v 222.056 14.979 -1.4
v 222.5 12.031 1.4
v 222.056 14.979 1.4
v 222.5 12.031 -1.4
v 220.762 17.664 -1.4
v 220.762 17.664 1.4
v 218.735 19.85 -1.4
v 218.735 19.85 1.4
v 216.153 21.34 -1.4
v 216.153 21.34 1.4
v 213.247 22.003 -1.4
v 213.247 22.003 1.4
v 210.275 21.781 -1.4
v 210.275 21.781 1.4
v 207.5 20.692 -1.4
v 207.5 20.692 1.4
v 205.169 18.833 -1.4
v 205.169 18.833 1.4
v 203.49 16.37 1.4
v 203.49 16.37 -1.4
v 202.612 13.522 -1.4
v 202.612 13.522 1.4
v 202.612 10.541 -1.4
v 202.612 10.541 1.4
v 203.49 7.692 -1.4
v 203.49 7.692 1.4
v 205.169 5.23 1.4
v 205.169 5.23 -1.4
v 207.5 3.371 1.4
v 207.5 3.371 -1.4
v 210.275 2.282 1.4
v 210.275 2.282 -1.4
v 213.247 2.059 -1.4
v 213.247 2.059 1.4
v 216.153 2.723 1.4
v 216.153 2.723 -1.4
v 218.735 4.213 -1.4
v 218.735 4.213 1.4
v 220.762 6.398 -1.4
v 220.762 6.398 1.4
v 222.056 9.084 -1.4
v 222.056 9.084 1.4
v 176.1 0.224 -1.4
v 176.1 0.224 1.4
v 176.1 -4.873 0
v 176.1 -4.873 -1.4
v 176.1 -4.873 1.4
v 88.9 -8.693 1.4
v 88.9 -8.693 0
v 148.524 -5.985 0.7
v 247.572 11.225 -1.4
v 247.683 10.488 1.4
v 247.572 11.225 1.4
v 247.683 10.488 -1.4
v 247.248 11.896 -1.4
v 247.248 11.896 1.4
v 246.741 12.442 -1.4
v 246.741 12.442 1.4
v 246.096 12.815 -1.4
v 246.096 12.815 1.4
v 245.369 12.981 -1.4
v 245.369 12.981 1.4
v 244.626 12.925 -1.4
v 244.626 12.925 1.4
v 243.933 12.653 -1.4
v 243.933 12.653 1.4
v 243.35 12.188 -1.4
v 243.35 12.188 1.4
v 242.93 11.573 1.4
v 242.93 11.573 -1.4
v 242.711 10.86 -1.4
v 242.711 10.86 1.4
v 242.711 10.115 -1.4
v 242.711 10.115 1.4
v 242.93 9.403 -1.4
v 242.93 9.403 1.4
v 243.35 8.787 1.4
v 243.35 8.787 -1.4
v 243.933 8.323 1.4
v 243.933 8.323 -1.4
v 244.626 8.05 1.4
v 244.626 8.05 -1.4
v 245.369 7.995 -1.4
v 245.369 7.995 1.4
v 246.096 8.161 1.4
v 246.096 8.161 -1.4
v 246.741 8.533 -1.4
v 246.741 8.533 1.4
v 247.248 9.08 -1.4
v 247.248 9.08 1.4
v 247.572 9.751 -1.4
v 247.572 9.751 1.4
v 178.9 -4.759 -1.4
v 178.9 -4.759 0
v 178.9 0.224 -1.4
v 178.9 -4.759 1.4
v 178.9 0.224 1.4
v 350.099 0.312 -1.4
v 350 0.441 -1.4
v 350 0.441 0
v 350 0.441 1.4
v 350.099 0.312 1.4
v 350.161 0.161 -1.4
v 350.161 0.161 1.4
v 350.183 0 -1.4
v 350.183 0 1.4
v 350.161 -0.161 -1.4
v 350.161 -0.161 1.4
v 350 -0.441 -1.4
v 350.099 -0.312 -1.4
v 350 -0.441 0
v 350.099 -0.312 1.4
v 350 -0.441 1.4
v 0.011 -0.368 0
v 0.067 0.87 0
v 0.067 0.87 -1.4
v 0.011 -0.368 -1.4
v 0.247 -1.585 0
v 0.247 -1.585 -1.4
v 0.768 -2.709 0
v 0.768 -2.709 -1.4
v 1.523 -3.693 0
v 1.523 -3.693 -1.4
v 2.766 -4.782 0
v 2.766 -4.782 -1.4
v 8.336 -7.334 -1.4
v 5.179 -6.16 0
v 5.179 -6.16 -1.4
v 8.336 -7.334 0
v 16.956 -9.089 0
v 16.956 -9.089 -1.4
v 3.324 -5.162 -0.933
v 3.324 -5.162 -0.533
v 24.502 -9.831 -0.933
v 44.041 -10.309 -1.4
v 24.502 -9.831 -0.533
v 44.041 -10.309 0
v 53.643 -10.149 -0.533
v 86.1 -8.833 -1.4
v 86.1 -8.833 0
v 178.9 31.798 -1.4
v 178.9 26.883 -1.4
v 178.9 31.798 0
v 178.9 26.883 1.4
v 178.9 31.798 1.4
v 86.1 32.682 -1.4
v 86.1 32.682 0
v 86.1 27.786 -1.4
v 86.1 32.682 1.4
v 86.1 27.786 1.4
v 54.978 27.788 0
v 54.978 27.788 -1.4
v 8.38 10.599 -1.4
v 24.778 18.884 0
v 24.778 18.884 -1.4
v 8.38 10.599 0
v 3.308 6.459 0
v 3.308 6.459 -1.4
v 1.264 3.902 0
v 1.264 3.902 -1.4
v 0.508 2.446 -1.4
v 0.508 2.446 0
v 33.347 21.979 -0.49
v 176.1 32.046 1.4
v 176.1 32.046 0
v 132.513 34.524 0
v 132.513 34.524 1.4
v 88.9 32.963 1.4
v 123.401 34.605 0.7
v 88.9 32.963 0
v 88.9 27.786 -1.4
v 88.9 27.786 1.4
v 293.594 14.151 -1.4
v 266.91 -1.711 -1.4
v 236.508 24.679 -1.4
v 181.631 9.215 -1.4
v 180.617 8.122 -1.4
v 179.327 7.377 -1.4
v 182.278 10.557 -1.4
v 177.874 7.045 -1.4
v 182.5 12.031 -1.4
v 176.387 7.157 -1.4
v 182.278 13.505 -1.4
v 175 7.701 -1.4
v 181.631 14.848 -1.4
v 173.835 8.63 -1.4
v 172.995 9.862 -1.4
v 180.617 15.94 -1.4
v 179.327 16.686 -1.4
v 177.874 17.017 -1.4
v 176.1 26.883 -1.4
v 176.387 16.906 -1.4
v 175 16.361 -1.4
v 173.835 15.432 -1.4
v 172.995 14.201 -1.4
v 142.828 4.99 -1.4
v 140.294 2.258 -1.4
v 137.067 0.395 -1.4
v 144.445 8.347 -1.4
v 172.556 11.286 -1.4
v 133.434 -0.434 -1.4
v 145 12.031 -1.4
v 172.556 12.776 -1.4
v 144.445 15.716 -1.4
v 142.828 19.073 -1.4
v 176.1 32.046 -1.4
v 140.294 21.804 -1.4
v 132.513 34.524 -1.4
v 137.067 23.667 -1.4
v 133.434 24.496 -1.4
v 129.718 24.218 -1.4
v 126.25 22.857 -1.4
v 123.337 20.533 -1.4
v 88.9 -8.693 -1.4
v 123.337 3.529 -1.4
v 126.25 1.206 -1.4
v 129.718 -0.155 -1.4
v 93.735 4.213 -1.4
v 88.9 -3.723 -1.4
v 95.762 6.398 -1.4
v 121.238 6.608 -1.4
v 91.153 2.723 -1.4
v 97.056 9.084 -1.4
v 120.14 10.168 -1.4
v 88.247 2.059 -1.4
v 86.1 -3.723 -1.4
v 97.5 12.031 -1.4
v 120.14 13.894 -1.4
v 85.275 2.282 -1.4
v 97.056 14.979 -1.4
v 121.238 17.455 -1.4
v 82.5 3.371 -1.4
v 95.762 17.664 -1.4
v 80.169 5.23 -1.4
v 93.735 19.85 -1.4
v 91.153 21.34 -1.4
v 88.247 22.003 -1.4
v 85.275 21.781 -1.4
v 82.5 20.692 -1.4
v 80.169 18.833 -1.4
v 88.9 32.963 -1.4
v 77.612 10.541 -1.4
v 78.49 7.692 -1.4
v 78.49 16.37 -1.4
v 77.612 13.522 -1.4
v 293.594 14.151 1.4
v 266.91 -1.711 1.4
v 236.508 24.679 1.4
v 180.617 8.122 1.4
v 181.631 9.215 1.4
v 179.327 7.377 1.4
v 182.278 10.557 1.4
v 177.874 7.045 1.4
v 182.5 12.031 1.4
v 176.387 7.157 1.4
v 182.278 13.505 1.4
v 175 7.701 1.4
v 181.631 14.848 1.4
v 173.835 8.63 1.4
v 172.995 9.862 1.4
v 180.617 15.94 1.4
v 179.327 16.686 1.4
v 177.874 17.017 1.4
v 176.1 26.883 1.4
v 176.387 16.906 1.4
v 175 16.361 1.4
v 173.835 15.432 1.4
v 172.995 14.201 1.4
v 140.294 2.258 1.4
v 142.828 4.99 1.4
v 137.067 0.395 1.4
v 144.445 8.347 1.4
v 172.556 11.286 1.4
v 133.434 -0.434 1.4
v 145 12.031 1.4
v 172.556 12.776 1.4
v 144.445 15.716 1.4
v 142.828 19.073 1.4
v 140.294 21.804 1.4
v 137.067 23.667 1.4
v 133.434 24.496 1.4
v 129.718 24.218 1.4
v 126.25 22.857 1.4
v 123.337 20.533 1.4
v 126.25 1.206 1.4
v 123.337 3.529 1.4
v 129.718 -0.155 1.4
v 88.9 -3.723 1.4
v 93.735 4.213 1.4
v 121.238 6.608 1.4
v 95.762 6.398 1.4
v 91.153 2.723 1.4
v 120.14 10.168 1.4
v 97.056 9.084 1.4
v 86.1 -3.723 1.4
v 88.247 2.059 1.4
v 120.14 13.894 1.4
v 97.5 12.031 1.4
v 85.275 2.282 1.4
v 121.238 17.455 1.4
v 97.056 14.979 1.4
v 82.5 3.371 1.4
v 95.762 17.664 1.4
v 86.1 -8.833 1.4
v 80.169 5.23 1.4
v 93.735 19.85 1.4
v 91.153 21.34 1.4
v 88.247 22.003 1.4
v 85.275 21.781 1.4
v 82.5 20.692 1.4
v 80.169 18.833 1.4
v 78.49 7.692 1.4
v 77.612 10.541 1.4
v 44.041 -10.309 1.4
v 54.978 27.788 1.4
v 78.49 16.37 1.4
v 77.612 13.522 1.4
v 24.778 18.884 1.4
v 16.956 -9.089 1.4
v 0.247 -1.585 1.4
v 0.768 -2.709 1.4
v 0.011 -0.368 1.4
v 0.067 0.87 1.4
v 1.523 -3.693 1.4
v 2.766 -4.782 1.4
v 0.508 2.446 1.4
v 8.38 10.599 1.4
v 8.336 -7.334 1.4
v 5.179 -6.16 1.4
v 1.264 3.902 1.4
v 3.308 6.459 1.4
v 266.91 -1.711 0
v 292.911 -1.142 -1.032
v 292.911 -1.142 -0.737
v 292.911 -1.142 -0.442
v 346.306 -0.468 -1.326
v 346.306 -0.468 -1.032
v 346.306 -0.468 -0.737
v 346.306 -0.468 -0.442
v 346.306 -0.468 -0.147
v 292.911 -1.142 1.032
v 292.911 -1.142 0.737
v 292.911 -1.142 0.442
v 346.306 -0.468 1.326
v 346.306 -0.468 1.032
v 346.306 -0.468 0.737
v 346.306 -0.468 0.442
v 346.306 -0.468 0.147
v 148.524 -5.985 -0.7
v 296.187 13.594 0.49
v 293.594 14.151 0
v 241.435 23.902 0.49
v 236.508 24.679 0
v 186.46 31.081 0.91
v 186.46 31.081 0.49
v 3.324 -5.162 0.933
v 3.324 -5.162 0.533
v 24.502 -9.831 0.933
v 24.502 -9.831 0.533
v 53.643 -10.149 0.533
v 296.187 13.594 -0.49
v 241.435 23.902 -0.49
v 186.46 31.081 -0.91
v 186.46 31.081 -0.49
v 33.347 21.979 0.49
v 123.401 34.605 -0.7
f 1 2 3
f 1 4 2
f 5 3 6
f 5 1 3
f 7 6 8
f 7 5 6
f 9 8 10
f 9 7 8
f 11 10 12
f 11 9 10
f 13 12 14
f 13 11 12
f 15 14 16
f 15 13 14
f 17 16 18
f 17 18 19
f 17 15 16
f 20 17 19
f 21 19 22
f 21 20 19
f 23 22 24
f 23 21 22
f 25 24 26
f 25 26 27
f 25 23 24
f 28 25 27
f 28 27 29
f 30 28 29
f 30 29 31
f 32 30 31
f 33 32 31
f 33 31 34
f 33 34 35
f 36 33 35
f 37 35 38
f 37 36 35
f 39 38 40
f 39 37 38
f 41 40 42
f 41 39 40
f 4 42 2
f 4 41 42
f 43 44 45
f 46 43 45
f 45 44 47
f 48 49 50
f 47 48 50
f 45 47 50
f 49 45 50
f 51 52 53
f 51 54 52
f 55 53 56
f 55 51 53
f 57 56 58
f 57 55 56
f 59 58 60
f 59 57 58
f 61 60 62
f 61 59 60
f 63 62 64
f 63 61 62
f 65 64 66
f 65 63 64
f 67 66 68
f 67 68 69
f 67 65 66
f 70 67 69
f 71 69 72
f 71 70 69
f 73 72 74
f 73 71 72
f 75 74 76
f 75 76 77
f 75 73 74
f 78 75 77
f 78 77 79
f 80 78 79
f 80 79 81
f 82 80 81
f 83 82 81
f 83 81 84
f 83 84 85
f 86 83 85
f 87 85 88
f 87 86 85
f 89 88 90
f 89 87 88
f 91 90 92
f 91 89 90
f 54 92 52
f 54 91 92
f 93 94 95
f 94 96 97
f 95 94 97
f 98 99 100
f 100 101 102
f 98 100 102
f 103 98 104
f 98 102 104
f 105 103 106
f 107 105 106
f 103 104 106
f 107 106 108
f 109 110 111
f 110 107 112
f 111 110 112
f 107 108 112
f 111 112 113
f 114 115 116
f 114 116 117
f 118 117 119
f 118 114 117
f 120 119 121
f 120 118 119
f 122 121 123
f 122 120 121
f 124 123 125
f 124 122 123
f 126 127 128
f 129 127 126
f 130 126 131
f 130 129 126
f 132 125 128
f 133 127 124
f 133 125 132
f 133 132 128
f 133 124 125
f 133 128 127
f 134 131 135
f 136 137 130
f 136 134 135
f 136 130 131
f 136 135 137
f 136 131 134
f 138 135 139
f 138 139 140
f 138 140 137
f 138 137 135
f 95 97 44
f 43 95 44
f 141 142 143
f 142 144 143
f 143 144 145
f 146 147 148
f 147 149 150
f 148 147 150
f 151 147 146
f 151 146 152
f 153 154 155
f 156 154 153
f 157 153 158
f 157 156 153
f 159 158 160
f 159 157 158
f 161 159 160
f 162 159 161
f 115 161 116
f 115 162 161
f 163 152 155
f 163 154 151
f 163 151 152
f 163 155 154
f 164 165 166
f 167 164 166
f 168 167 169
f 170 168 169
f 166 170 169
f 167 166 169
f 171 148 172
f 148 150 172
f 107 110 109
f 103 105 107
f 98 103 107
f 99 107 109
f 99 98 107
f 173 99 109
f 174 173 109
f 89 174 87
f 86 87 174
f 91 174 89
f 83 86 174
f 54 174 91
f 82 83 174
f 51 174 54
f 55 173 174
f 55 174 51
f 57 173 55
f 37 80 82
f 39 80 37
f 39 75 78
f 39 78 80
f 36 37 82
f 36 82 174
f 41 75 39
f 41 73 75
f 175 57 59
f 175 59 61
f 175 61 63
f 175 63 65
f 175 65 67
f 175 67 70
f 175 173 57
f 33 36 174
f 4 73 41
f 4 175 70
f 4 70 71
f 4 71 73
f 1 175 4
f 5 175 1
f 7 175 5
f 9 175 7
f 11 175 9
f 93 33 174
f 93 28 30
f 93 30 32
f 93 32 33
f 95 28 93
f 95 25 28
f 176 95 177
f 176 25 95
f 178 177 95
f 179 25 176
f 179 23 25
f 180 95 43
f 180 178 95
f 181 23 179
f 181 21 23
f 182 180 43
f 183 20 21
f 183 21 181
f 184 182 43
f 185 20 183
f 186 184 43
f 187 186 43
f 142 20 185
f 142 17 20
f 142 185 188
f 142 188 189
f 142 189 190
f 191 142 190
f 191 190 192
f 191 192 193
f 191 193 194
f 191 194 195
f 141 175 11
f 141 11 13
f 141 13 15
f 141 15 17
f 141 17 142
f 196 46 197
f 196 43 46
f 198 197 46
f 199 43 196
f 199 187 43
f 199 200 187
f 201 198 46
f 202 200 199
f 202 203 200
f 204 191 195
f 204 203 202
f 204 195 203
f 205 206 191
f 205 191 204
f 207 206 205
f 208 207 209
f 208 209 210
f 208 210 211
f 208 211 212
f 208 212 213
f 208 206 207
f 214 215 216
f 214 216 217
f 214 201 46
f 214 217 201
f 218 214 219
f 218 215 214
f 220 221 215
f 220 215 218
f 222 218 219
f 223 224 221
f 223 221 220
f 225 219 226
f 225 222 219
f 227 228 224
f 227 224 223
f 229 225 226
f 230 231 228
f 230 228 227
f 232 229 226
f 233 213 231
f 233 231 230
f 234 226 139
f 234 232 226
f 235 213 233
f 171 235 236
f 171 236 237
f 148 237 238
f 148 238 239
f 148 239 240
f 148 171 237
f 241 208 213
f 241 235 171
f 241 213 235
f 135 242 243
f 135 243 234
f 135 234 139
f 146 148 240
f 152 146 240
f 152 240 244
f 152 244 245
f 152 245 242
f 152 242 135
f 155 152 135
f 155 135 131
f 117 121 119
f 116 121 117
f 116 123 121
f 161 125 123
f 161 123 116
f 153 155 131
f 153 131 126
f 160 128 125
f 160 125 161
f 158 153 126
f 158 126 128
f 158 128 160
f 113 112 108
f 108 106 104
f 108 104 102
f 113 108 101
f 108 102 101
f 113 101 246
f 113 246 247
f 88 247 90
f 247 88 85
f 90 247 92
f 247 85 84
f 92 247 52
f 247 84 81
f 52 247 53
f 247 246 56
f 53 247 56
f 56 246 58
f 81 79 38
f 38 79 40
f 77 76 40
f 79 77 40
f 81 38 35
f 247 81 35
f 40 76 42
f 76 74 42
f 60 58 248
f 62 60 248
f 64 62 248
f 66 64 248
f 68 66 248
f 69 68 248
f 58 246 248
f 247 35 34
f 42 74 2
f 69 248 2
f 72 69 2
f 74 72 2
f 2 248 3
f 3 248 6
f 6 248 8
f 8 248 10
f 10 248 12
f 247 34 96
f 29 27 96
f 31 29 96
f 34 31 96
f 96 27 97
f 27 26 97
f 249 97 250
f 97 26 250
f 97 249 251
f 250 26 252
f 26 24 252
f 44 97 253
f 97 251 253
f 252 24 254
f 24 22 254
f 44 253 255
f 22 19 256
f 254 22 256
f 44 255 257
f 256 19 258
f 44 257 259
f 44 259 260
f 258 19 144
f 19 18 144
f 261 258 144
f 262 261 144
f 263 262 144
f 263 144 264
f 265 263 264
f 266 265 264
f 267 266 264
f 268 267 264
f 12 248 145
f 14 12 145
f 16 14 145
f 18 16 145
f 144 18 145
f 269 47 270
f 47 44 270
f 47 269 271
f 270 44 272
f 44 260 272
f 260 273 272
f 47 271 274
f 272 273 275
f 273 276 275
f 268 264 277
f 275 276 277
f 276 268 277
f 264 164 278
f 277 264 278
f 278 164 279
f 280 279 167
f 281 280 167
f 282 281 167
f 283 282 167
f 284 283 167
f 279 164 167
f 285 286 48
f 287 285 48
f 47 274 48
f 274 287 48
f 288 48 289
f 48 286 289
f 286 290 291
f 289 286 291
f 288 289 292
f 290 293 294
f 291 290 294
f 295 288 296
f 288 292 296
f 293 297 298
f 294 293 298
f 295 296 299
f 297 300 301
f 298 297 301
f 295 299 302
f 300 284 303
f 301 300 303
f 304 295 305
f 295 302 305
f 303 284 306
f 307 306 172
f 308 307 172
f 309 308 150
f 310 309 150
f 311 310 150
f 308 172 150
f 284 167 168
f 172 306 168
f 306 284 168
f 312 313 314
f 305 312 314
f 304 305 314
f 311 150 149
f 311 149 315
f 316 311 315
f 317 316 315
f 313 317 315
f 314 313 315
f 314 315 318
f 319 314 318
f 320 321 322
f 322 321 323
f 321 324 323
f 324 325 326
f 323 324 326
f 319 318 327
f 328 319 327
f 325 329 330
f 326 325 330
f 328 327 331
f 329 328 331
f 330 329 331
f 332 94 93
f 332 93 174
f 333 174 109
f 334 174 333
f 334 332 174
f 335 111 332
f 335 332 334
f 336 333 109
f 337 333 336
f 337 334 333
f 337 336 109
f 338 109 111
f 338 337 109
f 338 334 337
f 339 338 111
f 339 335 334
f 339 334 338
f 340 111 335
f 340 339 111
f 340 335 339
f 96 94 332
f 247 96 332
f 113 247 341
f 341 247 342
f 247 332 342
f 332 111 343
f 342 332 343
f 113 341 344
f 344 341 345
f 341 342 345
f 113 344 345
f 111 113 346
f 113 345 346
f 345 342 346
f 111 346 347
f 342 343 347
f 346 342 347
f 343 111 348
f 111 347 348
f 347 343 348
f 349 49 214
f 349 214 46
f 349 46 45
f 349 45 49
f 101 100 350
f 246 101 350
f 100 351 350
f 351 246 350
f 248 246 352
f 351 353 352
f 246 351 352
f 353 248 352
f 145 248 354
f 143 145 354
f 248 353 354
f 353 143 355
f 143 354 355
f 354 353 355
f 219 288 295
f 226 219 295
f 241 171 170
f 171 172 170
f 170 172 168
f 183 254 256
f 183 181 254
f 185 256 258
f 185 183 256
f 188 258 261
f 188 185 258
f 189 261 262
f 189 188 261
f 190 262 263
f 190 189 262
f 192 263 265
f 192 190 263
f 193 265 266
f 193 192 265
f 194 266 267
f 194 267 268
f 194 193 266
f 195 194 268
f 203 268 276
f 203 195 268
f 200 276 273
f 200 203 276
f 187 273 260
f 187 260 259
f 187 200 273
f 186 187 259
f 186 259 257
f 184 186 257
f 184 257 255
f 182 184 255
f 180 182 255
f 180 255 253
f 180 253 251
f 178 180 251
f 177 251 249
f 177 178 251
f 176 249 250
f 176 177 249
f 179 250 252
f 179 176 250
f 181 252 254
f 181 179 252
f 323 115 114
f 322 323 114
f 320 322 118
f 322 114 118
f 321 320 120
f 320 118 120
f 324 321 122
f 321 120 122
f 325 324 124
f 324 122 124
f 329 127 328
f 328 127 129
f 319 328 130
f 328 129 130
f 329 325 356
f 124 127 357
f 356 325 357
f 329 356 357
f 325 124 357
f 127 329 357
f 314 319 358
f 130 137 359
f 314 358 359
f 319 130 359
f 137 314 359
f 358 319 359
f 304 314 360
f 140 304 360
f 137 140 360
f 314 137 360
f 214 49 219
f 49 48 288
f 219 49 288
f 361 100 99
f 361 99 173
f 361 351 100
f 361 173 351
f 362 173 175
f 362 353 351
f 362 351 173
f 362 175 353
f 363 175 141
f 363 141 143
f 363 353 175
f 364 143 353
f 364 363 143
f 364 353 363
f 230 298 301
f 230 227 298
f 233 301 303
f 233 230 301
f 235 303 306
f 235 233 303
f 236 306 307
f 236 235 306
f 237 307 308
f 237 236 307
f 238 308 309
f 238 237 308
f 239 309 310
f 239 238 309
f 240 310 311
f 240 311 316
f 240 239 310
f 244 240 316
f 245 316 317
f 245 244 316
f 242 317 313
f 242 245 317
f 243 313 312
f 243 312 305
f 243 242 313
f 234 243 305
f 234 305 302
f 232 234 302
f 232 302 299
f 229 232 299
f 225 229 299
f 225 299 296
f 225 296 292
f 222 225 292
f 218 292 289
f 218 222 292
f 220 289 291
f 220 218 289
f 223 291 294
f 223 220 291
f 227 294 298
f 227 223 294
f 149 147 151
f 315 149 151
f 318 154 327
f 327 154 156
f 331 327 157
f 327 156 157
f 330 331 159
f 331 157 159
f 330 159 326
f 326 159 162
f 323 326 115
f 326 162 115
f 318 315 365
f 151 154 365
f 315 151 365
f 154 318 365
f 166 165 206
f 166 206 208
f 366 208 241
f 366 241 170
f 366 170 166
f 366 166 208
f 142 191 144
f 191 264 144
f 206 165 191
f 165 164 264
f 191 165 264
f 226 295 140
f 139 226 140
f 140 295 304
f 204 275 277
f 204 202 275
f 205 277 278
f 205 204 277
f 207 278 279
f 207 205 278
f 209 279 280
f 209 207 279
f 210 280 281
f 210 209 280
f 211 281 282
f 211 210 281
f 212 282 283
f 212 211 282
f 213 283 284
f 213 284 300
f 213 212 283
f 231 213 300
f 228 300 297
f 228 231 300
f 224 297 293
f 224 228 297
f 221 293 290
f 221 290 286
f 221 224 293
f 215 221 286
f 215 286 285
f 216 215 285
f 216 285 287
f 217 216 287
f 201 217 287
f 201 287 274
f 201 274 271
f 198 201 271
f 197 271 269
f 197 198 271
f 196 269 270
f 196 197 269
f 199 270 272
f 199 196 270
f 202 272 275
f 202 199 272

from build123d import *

# Parameters (mm, degrees)
SKETCH_2_R      = 10
SKETCH_2_R_2    = 5
SKETCH_2_R_3    = 12.5
SKETCH_2_R_4    = 2.5
EXTRUDE_1_DEPTH = 1.4


with BuildPart() as part:
    # Эскиз2 → Бобышка-Вытянуть1 (new body, symmetric)
    with BuildSketch(Plane.XY):
        with BuildLine():
            Line((86.1, 32.682283633), (86.1, 27.785621096))
            Line((86.1, 27.785621096), (88.9, 27.785621096))
            Line((88.9, 27.785621096), (88.9, 32.962973681))
            add(Edge.make_bspline(
                [(176.1, 32.045532515), (173.460642448, 32.274383054), (167.786299659, 32.738244602), (159.079993996, 33.354548335), (150.013824851, 33.880339702), (141.037533969, 34.297759375), (132.176453799, 34.561309726), (123.418285188, 34.636133951), (114.728660276, 34.522388831), (106.092728827, 34.217419352), (97.485414888, 33.712894632), (91.763569037, 33.237837821), (88.9, 32.962973681)],
                knots=[0.48932836, 0.48932836, 0.48932836, 0.48932836, 0.51130307, 0.536551515, 0.561723366, 0.586628867, 0.611085431, 0.6352512, 0.659272176, 0.683163753, 0.706922144, 0.730783121, 0.730783121, 0.730783121, 0.730783121], degree=3))
            Line((176.1, 32.045532515), (176.1, 26.882916451))
            Line((176.1, 26.882916451), (178.9, 26.882916451))
            Line((178.9, 26.882916451), (178.9, 31.797856127))
            add(Edge.make_bspline(
                [(350, 0.441), (348.817934836, 0.763027745), (345.408245977, 1.69192274), (339.347864917, 3.301674674), (331.589665686, 5.302675511), (323.091885591, 7.417212373), (314.238285126, 9.538012439), (305.242760894, 11.608254886), (296.187367062, 13.60762908), (287.101376113, 15.529324906), (277.995159278, 17.370991017), (268.873317879, 19.131417094), (259.738667962, 20.809730625), (250.593474588, 22.404766691), (241.439890638, 23.915343362), (232.280043933, 25.339758978), (223.116153021, 26.676302541), (213.950527179, 27.922839844), (204.785615162, 29.076995056), (195.623903708, 30.135946559), (186.99647265, 31.041402296), (181.421156727, 31.570451189), (178.9, 31.797856127)],
                knots=[0, 0, 0, 0, 0.0101622, 0.029313053, 0.052011605, 0.076619468, 0.101948061, 0.127526132, 0.153184131, 0.178867888, 0.204557903, 0.230245712, 0.255925967, 0.281594302, 0.30724642, 0.332878042, 0.358484538, 0.384061186, 0.409602822, 0.435103874, 0.460559416, 0.481556447, 0.481556447, 0.481556447, 0.481556447], degree=3))
            ThreePointArc((350, 0.441), (350.182668182, 0), (350, -0.441))
            add(Edge.make_bspline(
                [(178.9, -4.758637273), (181.652979317, -4.646278606), (187.626173611, -4.403273739), (196.81461857, -4.035333009), (206.460819266, -3.659492142), (216.093643375, -3.297876981), (225.715061788, -2.95311789), (235.327217645, -2.627287704), (244.932209931, -2.322100346), (254.532034352, -2.038929372), (264.128528247, -1.778536728), (273.723303235, -1.541558038), (283.317346051, -1.328064065), (292.909735844, -1.138021673), (302.493517153, -0.971016602), (312.041013985, -0.826421034), (321.464682241, -0.704096652), (330.522295396, -0.604119869), (338.773087678, -0.527128646), (345.182558015, -0.475350241), (348.76868735, -0.44977974), (350, -0.441)],
                knots=[0.517634386, 0.517634386, 0.517634386, 0.517634386, 0.540928595, 0.568176028, 0.595379569, 0.622543445, 0.64967326, 0.676775201, 0.703855228, 0.730918775, 0.757971338, 0.785017763, 0.812061651, 0.839103366, 0.866131651, 0.893099152, 0.919831065, 0.945809917, 0.969680601, 0.989589706, 1, 1, 1, 1], degree=3))
            Line((178.9, -4.758637273), (178.9, 0.224194977))
            Line((178.9, 0.224194977), (176.1, 0.224194977))
            Line((176.1, 0.224194977), (176.1, -4.873020948))
            add(Edge.make_bspline(
                [(88.9, -8.693267562), (89.617844041, -8.657365264), (93.544099689, -8.4603043), (100.675081793, -8.097607246), (110.279925807, -7.615552634), (119.854698054, -7.155331752), (129.404950626, -6.726934654), (138.957043666, -6.344774315), (148.536329767, -5.989584537), (158.156896352, -5.604325894), (167.348797605, -5.231176131), (173.335752744, -4.986028102), (176.1, -4.873020948)],
                knots=[0.263757046, 0.263757046, 0.263757046, 0.263757046, 0.269833583, 0.296993022, 0.324123272, 0.351139107, 0.378035509, 0.404946016, 0.431960837, 0.459078395, 0.4863474, 0.509737017, 0.509737017, 0.509737017, 0.509737017], degree=3))
            Line((88.9, -8.693267562), (88.9, -3.723116029))
            Line((88.9, -3.723116029), (86.1, -3.723116029))
            Line((86.1, -3.723116029), (86.1, -8.832579685))
            add(Edge.make_bspline(
                [(0.067165, 0.869995), (0.031799348, 0.52288612), (-0.038949105, -0.171499965), (0.109187697, -1.238208426), (0.489573911, -2.294373299), (1.140063589, -3.311096493), (2.048873093, -4.254985343), (3.207362223, -5.125399257), (4.62830025, -5.930091469), (6.349357867, -6.683143801), (8.441643964, -7.39506903), (11.016573701, -8.071443347), (14.236363949, -8.71040323), (18.305613464, -9.295466224), (23.419361508, -9.790139433), (29.665932935, -10.146283203), (36.959978182, -10.327294388), (45.07635799, -10.326759678), (53.756929463, -10.166011212), (62.800670475, -9.879297901), (72.081160335, -9.501034945), (79.871929674, -9.138172062), (84.562006059, -8.908655535), (86.1, -8.832579685)],
                knots=[0, 0, 0, 0, 0.002941446, 0.005884319, 0.00901613, 0.012364547, 0.016007934, 0.020036845, 0.024573728, 0.029783835, 0.03589701, 0.04324044, 0.052275965, 0.063634589, 0.077983176, 0.095698161, 0.116520086, 0.13966073, 0.16431217, 0.18991889, 0.216157201, 0.242837762, 0.255856498, 0.255856498, 0.255856498, 0.255856498], degree=3))
            add(Edge.make_bspline(
                [(86.1, 32.682283633), (84.251034658, 32.488999326), (79.618112888, 31.965003077), (72.248067764, 30.96669173), (64.042160436, 29.619190205), (55.994200632, 28.049519945), (48.157087779, 26.258842728), (40.614534945, 24.258661851), (33.496117772, 22.08061089), (26.978950376, 19.787977208), (21.250737748, 17.476669613), (16.436666106, 15.253855393), (12.543120617, 13.201408311), (9.465247652, 11.352044479), (7.047193647, 9.694493277), (5.140372907, 8.19592153), (3.628941572, 6.819827516), (2.433445936, 5.533634041), (1.497819162, 4.313324923), (0.800303575, 3.138270943), (0.302083458, 2.003099556), (0.143157814, 1.236538372), (0.067165, 0.869995)],
                knots=[0.738563451, 0.738563451, 0.738563451, 0.738563451, 0.7539832, 0.77723469, 0.800246382, 0.822950709, 0.845237155, 0.866915896, 0.887662335, 0.906968281, 0.924203157, 0.938878975, 0.950931611, 0.960693484, 0.968646729, 0.975232933, 0.980794744, 0.985583761, 0.989781539, 0.993521313, 0.996902113, 1, 1, 1, 1], degree=3))
        make_face()
        with Locations((87.5, 12.031252534)):
            Circle(SKETCH_2_R, mode=Mode.SUBTRACT)
        with Locations((177.5, 12.031252534)):
            Circle(SKETCH_2_R_2, mode=Mode.SUBTRACT)
        with Locations((132.5, 12.031252534)):
            Circle(SKETCH_2_R_3, mode=Mode.SUBTRACT)
        with Locations((212.5, 12.031252534)):
            Circle(SKETCH_2_R, mode=Mode.SUBTRACT)
        with Locations((245.182668182, 10.487815621)):
            Circle(SKETCH_2_R_4, mode=Mode.SUBTRACT)
    extrude(amount=EXTRUDE_1_DEPTH, both=True)


solid = part.part
